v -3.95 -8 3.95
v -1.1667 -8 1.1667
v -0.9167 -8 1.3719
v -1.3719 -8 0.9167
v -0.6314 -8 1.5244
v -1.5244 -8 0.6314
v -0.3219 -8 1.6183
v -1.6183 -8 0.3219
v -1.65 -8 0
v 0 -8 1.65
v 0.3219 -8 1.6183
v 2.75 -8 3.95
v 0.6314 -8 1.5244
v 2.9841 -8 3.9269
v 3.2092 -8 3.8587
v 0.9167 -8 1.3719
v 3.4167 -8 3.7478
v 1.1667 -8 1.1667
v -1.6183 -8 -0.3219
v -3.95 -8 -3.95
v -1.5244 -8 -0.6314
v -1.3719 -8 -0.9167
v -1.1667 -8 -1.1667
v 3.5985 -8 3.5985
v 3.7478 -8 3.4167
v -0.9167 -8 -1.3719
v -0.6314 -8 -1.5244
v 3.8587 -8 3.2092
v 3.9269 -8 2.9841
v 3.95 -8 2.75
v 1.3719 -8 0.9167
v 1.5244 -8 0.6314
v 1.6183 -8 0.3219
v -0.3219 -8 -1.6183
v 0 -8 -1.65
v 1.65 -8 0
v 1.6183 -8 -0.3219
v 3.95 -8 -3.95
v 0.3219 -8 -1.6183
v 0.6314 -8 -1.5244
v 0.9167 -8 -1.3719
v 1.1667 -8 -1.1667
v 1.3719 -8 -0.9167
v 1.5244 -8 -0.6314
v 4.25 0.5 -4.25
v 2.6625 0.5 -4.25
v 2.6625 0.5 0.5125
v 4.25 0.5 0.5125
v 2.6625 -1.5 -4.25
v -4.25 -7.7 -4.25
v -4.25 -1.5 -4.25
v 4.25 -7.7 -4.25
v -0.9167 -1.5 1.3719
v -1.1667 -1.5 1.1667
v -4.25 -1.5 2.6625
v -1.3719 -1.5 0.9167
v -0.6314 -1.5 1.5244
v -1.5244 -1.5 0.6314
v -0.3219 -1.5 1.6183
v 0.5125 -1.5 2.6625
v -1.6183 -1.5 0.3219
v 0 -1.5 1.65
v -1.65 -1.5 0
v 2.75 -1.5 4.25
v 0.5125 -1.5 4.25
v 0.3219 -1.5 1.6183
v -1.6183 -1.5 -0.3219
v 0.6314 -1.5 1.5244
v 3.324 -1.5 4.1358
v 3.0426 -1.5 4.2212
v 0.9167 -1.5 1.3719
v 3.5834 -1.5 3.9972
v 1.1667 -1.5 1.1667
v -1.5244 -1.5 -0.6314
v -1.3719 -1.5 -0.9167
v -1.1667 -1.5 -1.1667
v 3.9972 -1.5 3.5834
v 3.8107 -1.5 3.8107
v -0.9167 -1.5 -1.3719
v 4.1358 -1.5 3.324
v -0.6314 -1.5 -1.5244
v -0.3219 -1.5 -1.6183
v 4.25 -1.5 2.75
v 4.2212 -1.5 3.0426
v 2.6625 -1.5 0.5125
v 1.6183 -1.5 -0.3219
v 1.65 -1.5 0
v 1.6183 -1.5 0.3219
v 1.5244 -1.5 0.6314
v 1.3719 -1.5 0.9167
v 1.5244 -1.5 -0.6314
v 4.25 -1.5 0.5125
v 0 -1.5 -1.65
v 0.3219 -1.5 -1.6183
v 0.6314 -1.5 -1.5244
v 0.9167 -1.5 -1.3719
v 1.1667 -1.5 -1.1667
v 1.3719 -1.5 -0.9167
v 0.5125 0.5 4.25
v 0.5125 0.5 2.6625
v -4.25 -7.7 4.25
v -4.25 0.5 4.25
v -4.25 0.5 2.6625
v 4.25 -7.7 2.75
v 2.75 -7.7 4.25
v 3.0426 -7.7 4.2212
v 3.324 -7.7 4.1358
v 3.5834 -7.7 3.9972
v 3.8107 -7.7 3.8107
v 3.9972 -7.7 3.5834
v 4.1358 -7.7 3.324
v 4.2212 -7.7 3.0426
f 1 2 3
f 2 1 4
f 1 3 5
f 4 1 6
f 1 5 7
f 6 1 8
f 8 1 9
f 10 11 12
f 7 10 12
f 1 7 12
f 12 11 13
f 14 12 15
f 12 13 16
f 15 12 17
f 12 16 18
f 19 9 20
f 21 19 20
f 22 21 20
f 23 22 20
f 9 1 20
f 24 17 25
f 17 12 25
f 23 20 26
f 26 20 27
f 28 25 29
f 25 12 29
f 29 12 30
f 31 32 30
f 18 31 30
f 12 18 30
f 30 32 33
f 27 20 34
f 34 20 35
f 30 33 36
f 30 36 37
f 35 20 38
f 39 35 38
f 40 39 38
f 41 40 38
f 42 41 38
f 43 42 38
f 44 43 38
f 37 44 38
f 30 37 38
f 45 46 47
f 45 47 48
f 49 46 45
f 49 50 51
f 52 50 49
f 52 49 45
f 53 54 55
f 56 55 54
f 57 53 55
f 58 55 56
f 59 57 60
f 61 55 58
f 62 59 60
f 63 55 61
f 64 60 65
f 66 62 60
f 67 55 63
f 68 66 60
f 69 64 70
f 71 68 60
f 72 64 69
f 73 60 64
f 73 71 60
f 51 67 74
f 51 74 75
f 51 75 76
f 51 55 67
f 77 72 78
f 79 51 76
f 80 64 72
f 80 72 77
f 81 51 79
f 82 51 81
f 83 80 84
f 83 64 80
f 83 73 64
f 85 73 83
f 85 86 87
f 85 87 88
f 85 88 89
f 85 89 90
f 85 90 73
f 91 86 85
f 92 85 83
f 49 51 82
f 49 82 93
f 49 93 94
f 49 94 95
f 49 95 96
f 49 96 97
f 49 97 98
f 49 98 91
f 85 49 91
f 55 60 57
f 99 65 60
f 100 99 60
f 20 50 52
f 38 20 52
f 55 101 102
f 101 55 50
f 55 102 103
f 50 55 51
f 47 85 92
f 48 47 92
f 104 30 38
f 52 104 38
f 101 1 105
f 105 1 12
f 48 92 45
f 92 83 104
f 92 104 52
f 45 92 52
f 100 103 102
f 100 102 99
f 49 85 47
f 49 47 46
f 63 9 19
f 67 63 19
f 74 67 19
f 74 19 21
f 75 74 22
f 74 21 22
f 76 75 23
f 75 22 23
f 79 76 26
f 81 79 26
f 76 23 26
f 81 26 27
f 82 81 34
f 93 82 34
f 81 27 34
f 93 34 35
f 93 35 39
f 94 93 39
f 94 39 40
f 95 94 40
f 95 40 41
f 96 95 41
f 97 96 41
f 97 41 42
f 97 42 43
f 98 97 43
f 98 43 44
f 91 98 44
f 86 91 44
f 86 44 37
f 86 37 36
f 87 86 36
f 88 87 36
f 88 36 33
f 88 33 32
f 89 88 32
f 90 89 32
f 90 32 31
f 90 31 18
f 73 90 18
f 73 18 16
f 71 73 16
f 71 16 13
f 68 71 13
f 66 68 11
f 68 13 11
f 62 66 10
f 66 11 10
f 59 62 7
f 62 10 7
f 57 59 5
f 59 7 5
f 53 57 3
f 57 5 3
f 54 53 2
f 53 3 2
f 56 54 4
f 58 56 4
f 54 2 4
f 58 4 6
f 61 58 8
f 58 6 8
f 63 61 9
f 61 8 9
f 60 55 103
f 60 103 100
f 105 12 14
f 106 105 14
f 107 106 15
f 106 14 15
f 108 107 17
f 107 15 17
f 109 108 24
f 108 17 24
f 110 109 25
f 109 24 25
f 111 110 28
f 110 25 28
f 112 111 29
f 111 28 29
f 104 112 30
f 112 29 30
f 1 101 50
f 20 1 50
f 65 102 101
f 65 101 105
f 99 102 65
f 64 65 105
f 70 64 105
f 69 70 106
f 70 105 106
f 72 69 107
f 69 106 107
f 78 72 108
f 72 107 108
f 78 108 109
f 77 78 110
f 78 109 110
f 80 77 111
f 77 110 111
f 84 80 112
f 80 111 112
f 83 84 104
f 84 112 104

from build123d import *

# Parameters (mm, degrees)
BASE_W              = 8.5
BASE_H              = 8.5
BOSS_EXTRUDE1_DEPTH = 8
CUTOUT_W            = 7
CUTOUT_H            = 7
CUT_EXTRUDE1_DEPTH  = 1.5
SKETCH3_W           = 1.5
SKETCH3_H           = 1.5
CUT_EXTRUDE2_DEPTH  = 12.448253142
FILLET3_R           = 0.508
FILLET4_R           = 1.5
M4_TAPPED_HOLE1_D   = 3.3
CHAMFER1_SIZE       = 0.3
CUT_EXTRUDE3_START  = -1.5
CUT_EXTRUDE3_DEPTH  = 1.5
SKETCH16_W          = 1.5875
SKETCH16_H          = 4.7625
SKETCH16_W_2        = 4.7625
SKETCH16_H_2        = 1.5875
BOSS_EXTRUDE2_DEPTH = 2


with BuildPart() as part:
    # Base → Boss-Extrude1 (new body)
    with BuildSketch(Plane(origin=(0, 0, 0), x_dir=(1, 0, 0), z_dir=(0, 1, 0))):
        Rectangle(BASE_W, BASE_H)
    extrude(amount=-BOSS_EXTRUDE1_DEPTH)

    # Cutout → Cut-Extrude1 (cut)
    with BuildSketch(Plane(origin=(0, 0, 0), x_dir=(1, 0, 0), z_dir=(0, 1, 0))):
        with Locations((-0.75, 0.75)):
            Rectangle(CUTOUT_W, CUTOUT_H)
    extrude(amount=-CUT_EXTRUDE1_DEPTH, mode=Mode.SUBTRACT)

    # Sketch3 → Cut-Extrude2 (cut, through all)
    with BuildSketch(Plane.ZY.offset(-2.75)):
        with Locations((-3.5, -0.75)):
            Rectangle(SKETCH3_W, SKETCH3_H)
    cut_extrude2 = extrude(amount=-CUT_EXTRUDE2_DEPTH, mode=Mode.SUBTRACT)

    # Mirror1: Cut-Extrude2 across plane
    add(cut_extrude2.mirror(Plane(origin=(0, 0, 0), x_dir=(0.7071067811865476, 0, 0.7071067811865475), z_dir=(0.7071067811865475, 0, -0.7071067811865476))), mode=Mode.SUBTRACT)

    # Fillet3
    fillet3_edges = [part.edges().sort_by_distance(p)[0] for p in [
        (2.75, -0.75, 2.75),
    ]]
    fillet(fillet3_edges, radius=FILLET3_R)

    # Fillet4
    fillet4_edges = [part.edges().sort_by_distance(p)[0] for p in [
        (4.25, -4, 4.25),
    ]]
    fillet(fillet4_edges, radius=FILLET4_R)

    # M4 Tapped Hole1 (through all)
    with Locations(Plane(origin=(0, -1.5, 0), x_dir=(1, 0, 0), z_dir=(0, 1, 0))):
        with Locations((0, 0)):
            Hole(M4_TAPPED_HOLE1_D / 2)

    # Chamfer1
    chamfer1_edges = [part.edges().sort_by_distance(p)[0] for p in [
        (-4.25, -8, 0),
        (-0.75, -8, 4.25),
        (4.25, -8, -0.75),
        (3.810660172, -8, 3.810660172),
        (0, -8, -4.25),
    ]]
    chamfer(chamfer1_edges, length=CHAMFER1_SIZE)

    # Sketch14 → Cut-Extrude3 (cut)
    with BuildSketch(Plane(origin=(0, 0, 0), x_dir=(1, 0, 0), z_dir=(0, 1, 0)).offset(CUT_EXTRUDE3_START)):
        with BuildLine():
            Line((-2.75, -4.25), (2.75, -4.25))
            ThreePointArc((2.75, -4.25), (3.810660172, -3.810660172), (4.25, -2.75))
            Line((4.25, -2.75), (4.25, 2.75))
            Line((4.25, 2.75), (2.75, 2.75))
            Line((2.75, 2.75), (2.75, -2.242))
            ThreePointArc((2.75, -2.242), (2.601210245, -2.601210245), (2.242, -2.75))
            Line((2.242, -2.75), (-2.75, -2.75))
            Line((-2.75, -2.75), (-2.75, -4.25))
        make_face()
    extrude(amount=CUT_EXTRUDE3_DEPTH, mode=Mode.SUBTRACT)

    # Sketch16 → Boss-Extrude2 (add)
    with BuildSketch(Plane(origin=(0, -1.5, 0), x_dir=(1, 0, 0), z_dir=(0, 1, 0))):
        with Locations((3.45625, 1.86875)):
            Rectangle(SKETCH16_W, SKETCH16_H)
        with Locations((-1.86875, -3.45625)):
            Rectangle(SKETCH16_W_2, SKETCH16_H_2)
    extrude(amount=BOSS_EXTRUDE2_DEPTH)


solid = part.part
